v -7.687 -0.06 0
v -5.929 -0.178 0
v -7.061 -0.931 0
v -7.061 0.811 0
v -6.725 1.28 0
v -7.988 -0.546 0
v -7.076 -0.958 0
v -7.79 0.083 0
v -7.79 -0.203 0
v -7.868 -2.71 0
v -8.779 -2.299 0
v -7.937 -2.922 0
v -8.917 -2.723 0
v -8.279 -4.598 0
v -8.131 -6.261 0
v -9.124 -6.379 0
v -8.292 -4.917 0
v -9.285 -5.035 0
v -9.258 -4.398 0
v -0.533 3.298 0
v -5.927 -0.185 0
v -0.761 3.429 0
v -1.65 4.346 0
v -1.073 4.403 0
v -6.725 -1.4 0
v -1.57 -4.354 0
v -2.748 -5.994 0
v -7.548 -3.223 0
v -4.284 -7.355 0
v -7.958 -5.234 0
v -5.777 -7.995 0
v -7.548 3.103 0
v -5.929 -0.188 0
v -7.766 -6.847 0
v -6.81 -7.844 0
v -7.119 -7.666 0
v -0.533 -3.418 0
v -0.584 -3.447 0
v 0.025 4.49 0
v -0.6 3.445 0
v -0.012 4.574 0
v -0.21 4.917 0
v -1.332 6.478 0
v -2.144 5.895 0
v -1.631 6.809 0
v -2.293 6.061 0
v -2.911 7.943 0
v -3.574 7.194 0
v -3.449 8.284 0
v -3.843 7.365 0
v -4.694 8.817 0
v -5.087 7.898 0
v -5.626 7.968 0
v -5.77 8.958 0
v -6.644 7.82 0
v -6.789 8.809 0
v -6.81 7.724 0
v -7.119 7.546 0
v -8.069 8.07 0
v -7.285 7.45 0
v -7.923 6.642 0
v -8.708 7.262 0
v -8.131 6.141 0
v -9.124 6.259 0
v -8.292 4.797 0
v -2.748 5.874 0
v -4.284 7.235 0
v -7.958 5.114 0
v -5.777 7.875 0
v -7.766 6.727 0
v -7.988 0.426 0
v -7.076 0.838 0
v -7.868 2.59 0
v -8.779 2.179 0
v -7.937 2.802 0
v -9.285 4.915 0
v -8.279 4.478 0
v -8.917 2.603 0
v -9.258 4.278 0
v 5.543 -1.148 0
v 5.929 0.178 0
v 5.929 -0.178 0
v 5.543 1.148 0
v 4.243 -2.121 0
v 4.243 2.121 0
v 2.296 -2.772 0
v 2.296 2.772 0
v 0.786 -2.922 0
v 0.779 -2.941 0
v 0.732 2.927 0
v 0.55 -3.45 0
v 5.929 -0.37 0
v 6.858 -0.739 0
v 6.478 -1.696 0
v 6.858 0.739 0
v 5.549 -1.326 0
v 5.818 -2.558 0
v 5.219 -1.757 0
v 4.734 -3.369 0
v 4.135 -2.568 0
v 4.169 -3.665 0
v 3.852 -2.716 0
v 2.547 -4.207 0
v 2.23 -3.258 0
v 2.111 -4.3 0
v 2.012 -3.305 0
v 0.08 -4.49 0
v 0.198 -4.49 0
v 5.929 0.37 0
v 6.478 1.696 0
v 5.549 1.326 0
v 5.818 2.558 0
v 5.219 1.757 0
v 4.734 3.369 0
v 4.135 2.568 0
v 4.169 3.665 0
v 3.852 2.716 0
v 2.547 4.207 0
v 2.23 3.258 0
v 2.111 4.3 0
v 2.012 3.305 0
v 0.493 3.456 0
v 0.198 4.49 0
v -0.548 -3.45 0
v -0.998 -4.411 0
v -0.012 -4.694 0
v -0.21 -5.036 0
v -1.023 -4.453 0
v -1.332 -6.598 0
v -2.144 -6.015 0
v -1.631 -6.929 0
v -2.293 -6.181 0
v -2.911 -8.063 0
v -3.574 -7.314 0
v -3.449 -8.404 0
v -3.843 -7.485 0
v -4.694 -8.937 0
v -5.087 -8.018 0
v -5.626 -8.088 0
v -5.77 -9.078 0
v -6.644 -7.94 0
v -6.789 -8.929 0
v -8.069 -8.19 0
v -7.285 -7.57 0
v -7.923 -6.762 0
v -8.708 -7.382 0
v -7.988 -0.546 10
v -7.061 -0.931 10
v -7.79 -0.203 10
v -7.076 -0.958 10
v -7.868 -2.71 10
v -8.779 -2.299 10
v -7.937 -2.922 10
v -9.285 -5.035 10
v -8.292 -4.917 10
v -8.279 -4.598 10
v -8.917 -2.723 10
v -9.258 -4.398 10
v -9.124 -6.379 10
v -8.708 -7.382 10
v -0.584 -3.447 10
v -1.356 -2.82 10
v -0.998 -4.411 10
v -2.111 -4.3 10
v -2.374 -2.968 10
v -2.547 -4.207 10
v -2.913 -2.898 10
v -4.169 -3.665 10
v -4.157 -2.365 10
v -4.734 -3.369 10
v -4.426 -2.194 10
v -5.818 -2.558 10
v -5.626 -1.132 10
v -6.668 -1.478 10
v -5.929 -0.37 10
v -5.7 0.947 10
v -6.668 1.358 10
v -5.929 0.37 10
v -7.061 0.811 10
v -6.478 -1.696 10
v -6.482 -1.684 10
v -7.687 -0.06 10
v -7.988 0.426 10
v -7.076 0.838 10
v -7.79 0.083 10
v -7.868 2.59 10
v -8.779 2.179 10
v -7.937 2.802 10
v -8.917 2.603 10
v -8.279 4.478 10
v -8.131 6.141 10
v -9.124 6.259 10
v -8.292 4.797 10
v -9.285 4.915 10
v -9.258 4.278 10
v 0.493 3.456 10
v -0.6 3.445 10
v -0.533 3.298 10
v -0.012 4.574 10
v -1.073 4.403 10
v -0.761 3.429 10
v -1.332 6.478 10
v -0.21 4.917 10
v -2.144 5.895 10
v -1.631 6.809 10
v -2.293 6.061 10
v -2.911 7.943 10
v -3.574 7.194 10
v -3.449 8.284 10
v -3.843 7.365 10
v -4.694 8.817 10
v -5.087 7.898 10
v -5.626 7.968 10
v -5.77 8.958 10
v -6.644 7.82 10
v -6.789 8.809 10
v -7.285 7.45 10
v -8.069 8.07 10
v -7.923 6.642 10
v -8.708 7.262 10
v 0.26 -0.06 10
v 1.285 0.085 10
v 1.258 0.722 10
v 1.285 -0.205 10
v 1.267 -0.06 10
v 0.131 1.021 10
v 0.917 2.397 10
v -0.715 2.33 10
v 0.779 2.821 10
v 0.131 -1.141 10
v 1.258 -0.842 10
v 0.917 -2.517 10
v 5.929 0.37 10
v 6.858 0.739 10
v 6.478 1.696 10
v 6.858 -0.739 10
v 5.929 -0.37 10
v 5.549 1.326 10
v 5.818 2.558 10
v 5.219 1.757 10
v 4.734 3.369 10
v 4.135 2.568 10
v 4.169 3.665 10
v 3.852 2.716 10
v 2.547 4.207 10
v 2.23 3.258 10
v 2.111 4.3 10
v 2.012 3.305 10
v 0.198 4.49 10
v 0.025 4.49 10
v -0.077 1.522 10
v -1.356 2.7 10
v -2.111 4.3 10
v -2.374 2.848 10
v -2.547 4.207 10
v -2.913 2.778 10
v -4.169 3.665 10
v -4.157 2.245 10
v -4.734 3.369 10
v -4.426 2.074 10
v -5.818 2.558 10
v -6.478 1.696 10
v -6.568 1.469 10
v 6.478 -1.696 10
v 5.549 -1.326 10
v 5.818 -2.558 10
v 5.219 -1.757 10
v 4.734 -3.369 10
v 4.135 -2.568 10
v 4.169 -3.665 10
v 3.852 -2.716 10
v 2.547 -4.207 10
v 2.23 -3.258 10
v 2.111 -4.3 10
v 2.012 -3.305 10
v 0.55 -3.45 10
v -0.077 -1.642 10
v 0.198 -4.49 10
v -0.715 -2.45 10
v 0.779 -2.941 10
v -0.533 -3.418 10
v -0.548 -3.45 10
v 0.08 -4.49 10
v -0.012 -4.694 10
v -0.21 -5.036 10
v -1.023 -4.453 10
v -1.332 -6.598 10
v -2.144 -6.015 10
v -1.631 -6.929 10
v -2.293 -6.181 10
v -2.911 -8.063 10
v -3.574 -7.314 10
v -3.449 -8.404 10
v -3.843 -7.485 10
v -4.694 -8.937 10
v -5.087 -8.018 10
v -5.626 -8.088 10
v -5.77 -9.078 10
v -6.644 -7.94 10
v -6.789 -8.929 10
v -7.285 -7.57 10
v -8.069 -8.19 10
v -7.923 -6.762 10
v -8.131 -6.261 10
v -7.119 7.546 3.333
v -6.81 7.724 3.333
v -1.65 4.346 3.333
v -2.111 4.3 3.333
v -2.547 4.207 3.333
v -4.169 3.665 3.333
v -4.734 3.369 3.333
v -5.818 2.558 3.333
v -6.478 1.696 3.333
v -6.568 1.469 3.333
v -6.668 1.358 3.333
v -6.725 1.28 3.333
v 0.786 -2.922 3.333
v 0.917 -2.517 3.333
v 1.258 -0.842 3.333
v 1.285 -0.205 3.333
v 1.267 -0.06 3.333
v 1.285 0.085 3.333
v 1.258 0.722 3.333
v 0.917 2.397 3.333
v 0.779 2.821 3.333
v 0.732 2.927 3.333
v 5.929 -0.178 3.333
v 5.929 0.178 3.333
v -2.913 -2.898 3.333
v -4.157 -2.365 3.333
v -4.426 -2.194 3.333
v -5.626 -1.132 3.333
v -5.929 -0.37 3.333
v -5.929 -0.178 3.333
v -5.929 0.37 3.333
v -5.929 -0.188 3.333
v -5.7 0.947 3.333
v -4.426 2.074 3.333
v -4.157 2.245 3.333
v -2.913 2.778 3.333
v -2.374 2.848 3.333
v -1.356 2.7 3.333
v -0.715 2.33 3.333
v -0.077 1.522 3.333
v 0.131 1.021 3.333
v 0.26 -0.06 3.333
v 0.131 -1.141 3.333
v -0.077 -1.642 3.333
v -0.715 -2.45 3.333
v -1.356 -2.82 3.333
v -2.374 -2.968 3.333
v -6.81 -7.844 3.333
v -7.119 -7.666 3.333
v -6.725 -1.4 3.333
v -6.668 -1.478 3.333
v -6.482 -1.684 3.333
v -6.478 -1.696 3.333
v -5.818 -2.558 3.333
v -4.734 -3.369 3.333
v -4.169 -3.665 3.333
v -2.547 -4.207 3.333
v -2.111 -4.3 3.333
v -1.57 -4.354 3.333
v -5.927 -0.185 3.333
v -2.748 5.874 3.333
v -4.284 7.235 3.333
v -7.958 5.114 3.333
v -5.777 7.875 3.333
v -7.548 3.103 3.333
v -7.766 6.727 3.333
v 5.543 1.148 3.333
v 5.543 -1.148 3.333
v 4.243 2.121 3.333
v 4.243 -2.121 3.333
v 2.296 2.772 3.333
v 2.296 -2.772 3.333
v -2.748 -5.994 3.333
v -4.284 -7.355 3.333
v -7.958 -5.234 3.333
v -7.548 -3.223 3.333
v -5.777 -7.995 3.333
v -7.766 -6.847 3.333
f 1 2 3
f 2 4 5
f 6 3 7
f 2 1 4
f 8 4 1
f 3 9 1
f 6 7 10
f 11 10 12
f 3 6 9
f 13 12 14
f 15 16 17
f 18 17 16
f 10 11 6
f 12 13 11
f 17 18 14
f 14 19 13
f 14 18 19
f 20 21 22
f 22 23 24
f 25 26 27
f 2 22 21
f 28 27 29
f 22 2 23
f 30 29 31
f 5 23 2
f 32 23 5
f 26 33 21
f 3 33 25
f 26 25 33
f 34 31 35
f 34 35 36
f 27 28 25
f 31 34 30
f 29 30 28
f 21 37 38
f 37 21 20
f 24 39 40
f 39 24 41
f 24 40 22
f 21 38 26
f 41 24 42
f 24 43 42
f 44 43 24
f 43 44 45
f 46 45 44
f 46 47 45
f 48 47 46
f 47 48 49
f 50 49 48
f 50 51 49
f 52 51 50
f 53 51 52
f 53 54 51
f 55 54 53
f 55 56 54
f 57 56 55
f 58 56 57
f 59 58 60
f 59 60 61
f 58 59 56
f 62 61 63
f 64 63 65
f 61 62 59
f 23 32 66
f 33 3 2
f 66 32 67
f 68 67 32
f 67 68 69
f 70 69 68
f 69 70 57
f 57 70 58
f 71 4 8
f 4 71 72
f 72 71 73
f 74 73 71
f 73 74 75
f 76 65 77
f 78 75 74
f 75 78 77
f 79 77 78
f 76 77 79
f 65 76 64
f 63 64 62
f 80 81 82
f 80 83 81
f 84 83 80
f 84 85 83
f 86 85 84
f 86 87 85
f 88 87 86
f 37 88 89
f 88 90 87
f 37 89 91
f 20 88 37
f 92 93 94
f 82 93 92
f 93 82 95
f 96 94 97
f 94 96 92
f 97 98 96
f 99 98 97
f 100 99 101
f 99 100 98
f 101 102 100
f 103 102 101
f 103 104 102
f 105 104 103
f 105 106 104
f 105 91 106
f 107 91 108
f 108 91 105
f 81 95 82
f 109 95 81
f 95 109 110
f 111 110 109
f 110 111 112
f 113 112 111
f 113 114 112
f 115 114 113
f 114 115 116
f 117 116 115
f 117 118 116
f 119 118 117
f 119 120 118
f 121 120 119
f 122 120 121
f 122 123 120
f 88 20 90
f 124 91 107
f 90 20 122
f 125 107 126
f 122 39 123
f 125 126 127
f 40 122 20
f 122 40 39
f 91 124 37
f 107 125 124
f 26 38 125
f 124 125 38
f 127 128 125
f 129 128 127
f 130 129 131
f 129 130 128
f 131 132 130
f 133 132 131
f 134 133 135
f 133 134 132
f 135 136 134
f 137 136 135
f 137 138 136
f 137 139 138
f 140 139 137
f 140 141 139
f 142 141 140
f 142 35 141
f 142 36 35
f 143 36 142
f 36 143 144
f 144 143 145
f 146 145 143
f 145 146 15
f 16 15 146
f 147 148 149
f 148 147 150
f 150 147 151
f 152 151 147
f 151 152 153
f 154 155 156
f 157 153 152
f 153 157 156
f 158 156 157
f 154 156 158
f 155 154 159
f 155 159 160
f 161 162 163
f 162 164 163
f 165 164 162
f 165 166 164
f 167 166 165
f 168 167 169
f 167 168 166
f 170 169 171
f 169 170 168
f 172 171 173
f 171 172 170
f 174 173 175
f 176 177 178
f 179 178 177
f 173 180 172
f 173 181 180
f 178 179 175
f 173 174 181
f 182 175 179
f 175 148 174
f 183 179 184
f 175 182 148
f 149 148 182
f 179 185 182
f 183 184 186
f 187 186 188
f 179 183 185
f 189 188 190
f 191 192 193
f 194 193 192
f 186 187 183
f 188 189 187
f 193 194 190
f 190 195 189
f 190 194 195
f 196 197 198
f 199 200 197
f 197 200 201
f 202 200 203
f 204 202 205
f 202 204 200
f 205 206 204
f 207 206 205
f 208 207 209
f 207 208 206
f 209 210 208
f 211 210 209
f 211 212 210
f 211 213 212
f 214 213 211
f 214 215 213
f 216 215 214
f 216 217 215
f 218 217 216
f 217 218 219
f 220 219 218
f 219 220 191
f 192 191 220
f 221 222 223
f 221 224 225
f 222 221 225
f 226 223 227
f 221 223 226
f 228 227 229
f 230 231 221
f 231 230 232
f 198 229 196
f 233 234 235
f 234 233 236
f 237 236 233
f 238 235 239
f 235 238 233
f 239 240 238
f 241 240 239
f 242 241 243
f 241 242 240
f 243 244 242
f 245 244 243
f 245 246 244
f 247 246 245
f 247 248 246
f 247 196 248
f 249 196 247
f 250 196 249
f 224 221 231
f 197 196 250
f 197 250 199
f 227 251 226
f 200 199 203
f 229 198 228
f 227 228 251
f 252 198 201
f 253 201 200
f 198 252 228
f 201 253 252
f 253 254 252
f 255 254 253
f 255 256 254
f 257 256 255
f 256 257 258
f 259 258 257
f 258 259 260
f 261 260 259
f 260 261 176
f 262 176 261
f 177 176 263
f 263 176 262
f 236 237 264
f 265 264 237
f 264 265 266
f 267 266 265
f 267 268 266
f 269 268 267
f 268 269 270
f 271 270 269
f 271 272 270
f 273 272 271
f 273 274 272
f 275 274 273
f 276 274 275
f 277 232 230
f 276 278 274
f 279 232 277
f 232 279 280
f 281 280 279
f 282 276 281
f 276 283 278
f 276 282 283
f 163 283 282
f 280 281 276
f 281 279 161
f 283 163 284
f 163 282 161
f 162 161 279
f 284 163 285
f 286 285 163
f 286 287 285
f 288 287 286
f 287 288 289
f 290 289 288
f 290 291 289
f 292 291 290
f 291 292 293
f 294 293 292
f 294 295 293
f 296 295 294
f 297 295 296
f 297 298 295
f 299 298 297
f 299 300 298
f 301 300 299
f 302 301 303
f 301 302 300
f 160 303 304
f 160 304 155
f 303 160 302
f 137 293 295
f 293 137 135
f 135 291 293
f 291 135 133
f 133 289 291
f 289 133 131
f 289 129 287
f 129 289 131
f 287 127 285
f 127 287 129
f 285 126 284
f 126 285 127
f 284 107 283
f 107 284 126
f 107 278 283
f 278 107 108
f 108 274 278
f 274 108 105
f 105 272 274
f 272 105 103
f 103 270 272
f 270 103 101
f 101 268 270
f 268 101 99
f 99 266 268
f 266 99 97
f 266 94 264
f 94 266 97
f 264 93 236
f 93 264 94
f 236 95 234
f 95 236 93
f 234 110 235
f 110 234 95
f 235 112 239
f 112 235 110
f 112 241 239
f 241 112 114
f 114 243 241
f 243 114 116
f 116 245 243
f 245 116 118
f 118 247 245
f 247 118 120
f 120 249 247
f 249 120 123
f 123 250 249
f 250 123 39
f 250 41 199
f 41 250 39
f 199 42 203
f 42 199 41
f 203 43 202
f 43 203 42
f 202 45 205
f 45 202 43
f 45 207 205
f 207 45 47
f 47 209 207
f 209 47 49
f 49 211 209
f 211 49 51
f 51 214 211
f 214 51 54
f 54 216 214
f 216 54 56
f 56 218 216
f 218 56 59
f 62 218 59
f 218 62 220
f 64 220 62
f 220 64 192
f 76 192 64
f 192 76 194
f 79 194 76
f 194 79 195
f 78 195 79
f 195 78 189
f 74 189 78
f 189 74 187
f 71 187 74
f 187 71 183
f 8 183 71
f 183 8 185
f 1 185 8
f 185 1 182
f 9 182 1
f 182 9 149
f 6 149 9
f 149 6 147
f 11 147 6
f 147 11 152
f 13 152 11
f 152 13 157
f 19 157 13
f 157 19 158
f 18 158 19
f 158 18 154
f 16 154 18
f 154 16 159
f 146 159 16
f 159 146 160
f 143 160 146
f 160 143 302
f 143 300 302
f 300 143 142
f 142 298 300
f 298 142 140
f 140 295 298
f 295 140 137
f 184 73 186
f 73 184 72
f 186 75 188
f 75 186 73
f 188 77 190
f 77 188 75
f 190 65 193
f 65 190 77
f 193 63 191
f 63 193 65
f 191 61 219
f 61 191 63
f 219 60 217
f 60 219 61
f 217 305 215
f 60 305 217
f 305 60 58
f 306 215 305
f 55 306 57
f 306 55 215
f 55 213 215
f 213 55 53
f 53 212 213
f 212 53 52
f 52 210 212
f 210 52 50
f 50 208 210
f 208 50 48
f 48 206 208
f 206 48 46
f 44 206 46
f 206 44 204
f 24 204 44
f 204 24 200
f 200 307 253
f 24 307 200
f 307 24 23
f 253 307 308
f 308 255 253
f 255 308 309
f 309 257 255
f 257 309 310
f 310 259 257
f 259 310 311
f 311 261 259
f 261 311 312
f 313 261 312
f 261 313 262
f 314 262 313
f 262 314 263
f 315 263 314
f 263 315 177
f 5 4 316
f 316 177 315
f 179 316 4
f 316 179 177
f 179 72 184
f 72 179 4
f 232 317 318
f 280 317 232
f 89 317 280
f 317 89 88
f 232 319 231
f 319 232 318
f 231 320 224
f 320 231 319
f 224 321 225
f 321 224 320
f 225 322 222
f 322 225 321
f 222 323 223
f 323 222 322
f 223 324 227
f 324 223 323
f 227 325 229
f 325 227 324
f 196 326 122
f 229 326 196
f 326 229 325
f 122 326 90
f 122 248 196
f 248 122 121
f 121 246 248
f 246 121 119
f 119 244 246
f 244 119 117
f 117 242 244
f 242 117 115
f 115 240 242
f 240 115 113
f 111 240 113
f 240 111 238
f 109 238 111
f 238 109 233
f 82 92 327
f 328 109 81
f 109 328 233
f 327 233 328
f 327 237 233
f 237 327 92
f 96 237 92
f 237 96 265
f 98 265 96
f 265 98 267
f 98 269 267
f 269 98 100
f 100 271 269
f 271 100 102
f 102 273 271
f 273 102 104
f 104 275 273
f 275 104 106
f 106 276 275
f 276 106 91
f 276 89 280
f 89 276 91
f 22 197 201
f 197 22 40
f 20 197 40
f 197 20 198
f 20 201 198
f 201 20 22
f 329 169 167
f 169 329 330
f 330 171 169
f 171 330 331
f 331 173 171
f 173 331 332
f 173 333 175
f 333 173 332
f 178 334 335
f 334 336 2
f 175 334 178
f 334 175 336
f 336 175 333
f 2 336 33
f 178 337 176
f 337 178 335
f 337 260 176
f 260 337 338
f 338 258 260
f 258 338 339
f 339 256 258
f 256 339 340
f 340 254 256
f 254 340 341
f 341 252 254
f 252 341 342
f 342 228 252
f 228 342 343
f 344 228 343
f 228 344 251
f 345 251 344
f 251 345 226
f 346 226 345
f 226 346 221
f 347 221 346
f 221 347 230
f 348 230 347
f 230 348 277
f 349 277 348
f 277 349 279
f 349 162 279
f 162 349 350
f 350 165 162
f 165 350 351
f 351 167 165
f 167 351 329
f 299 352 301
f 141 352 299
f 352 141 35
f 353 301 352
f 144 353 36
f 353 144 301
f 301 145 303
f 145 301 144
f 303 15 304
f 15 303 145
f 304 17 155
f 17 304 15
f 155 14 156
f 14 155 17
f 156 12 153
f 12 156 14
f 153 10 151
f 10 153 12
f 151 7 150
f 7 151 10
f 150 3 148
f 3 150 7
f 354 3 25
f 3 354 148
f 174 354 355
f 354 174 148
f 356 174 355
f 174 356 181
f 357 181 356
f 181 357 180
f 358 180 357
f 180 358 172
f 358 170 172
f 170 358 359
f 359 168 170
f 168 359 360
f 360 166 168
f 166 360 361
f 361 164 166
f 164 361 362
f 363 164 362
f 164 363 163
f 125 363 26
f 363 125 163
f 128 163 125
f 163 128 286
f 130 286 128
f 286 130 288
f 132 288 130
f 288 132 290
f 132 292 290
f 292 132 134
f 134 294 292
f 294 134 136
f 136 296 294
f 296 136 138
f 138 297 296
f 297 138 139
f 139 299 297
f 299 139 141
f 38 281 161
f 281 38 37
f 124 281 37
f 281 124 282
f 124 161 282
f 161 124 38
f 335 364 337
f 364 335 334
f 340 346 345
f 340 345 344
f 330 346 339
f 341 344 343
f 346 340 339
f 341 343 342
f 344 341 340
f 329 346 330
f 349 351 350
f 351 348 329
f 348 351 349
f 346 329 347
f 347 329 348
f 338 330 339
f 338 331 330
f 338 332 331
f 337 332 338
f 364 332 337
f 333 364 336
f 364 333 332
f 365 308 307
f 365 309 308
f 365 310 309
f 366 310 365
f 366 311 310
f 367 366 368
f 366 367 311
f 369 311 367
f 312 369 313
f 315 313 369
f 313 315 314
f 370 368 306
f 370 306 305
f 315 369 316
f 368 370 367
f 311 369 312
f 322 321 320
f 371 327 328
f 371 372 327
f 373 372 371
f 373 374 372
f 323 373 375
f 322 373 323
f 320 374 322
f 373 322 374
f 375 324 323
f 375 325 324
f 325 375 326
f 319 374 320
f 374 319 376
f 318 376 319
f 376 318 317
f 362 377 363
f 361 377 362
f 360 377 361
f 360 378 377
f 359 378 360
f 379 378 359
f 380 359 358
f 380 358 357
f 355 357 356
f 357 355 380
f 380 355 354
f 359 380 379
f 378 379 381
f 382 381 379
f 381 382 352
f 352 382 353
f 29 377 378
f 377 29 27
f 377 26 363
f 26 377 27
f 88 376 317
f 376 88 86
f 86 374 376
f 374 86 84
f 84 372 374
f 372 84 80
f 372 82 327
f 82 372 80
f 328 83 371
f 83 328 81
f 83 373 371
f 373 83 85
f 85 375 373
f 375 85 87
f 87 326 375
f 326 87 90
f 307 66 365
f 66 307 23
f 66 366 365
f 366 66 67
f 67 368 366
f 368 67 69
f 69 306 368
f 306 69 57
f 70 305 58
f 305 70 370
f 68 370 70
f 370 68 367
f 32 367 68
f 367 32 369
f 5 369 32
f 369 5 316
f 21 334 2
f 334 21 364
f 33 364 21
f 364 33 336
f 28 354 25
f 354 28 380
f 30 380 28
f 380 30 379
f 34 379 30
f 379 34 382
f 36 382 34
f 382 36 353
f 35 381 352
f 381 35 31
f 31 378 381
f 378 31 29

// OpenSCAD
d1=10; // dimension of ellipse
h=10;   // height of spoon holder

linear_extrude(height = h, twist = 0, slices = 6){
 difference()
 {
     offset(r=2)
{
     resize([d1,d1/2])circle(d=d1);
}
     offset(r=1)
{
     resize([d1,d1/2])circle(d=d1);
}
}

difference()
 {
     offset(r=2)
{

translate([-4,-2.62,0])rotate([0,0,60]) resize([d1,d1/2])circle(d=d1);
}
offset(r=1)
{
translate([-4,-2.62,0])rotate([0,0,60]) resize([d1,d1/2])circle(d=d1);
}
}
difference()
 {
     offset(r=2)
{
 translate([-4,2.5,0])rotate([0,0,120]) resize([d1,d1/2])circle(d=d1);
}
offset(r=1)
{
  translate([-4,2.5,0])rotate([0,0,120]) resize([d1,d1/2])circle(d=d1);
}
}
}
linear_extrude(height = h/3, twist = 0, slices = 6){
resize([d1*1.2,(d1*1.2)/2])circle(d=d1);
     translate([-4,-2.62,0])rotate([0,0,60]) resize([d1*1.2,(d1*1.2)/2])circle(d=d1);
     translate([-4,2.5,0])rotate([0,0,120]) resize([d1*1.2,(d1*1.2)/2])circle(d=d1);
     }
